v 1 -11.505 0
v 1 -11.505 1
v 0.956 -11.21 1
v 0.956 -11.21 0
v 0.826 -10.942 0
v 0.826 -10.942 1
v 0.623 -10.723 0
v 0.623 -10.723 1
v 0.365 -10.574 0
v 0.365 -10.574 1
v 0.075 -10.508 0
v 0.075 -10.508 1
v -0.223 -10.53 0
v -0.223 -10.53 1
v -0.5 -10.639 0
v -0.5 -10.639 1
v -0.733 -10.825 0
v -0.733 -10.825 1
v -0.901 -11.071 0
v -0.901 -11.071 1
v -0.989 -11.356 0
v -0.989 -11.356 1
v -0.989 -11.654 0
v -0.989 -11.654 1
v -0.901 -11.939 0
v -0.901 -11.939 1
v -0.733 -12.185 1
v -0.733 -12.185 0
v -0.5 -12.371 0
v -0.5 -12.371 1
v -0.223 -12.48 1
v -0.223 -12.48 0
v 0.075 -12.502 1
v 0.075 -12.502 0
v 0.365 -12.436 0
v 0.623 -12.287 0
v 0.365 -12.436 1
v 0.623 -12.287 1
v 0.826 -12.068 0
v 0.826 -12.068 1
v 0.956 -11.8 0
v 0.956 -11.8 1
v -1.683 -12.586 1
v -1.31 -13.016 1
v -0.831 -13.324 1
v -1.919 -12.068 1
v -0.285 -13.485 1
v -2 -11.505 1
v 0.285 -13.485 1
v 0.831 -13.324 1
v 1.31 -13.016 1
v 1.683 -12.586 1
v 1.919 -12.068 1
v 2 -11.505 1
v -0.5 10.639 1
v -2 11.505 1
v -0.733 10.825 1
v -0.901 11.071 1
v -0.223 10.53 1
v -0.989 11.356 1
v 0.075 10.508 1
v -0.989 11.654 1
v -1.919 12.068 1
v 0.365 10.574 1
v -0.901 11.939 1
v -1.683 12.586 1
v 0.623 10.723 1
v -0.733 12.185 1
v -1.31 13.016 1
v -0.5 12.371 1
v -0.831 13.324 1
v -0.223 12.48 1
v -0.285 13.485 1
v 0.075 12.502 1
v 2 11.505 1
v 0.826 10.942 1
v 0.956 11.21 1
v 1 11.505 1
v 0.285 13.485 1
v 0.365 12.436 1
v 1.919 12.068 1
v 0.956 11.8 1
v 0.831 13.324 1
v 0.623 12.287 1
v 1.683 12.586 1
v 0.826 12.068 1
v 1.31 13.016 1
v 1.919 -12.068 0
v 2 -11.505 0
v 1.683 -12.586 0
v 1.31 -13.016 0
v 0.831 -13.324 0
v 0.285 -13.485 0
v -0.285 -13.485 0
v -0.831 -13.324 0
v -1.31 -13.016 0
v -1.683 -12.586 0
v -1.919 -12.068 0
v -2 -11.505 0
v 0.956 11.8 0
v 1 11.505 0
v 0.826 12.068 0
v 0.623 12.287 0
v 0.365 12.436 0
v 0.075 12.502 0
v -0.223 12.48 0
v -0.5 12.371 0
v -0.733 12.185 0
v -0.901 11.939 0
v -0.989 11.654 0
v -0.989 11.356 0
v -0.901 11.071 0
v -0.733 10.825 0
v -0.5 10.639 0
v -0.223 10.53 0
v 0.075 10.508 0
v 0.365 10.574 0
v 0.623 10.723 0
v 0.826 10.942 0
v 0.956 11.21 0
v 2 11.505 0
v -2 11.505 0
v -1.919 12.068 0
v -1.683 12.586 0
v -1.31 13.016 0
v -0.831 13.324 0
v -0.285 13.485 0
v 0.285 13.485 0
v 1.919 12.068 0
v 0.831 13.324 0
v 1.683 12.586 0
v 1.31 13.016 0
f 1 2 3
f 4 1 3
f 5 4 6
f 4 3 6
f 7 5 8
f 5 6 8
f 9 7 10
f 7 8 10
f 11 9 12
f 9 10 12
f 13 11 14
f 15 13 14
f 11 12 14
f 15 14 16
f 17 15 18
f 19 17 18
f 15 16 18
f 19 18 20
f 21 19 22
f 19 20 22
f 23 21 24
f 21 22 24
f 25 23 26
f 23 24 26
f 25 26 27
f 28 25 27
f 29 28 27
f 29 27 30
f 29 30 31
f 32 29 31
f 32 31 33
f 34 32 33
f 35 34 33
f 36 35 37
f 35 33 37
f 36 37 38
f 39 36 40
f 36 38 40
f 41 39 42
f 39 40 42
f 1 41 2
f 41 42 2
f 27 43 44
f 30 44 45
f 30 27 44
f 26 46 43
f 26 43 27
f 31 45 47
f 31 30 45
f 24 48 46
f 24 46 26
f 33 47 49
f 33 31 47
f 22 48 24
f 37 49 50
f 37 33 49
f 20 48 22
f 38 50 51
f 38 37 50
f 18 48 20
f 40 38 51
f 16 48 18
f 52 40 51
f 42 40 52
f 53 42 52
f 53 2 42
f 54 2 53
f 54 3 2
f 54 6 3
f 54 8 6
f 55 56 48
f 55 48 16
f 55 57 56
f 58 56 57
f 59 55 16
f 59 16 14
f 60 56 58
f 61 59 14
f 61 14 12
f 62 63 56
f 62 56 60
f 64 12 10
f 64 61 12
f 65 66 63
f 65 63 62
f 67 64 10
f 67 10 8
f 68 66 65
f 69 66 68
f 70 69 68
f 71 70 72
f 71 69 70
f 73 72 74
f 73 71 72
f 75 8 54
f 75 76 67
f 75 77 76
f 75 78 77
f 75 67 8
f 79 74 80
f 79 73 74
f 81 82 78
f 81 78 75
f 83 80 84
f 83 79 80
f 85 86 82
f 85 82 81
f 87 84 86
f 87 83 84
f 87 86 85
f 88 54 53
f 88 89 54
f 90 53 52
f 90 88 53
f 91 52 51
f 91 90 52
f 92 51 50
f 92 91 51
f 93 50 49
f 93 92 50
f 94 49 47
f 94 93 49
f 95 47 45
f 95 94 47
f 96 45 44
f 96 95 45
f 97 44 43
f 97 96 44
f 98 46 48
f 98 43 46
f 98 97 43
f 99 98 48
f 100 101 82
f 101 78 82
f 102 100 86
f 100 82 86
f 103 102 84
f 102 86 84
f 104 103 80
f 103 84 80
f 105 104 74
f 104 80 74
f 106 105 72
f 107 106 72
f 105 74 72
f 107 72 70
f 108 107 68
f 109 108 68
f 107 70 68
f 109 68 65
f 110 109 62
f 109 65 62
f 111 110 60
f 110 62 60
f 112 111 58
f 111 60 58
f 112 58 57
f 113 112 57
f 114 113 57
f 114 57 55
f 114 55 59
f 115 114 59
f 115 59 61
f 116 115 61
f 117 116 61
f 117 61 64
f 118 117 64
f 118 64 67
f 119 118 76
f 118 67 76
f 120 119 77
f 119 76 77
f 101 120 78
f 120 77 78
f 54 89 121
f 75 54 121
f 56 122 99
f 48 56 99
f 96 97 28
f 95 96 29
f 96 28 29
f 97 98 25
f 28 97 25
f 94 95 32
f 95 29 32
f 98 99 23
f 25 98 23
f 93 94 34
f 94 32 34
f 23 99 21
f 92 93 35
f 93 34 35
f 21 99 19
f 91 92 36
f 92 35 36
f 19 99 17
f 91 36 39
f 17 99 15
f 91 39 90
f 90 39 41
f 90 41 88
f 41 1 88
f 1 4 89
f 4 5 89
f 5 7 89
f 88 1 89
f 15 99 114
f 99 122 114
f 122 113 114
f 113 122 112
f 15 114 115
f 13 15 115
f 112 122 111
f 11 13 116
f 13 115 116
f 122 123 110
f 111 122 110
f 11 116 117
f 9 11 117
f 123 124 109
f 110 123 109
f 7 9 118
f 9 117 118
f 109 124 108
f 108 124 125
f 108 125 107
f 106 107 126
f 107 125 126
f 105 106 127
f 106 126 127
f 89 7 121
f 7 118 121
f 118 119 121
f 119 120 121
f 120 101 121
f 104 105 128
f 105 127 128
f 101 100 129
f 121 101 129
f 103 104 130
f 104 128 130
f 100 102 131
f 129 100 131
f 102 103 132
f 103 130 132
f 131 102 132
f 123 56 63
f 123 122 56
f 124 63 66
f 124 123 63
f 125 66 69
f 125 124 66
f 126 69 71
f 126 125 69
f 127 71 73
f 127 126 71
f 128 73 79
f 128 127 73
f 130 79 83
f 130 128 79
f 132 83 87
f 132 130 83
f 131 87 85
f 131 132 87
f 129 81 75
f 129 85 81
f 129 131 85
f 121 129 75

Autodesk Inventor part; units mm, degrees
ref_plane "YZ Plane" through (0, 0, 0) normal (1, 0, 0) x (0, 1, 0)
ref_plane "XZ Plane" through (0, 0, 0) normal (0, 1, 0) x (-1, 0, 0)
ref_plane "XY Plane" through (0, 0, 0) normal (0, 0, 1) x (1, 0, 0)
sketch "草圖1" plane through (0, 0, 0) normal (0, 0, 1) x (1, 0, 0)
  line L0 (0, -11.505) -> (0, 11.505) construction
  line L1 (2, -11.505) -> (2, 11.505)
  line L2 (-2, 11.505) -> (-2, -11.505)
  arc A0 (-2, -11.505) -> (2, -11.505) centre (0, -11.505) ccw
  arc A1 (2, 11.505) -> (-2, 11.505) centre (0, 11.505) ccw
  point P0 (0, 0)
  dimension "d0" = 23.01
  dimension "d1" = 4
extrude "擠出1" add sketch "草圖1" along normal blind 1
sketch "草圖2" plane through (0, 0, 1) normal (0, 0, 1) x (1, 0, 0)
  arc A0 (2, 11.505) -> (-2, 11.505) centre (0, 11.505) ccw projected
  circle A1 centre (0, 11.505) radius 0.75
  arc A2 (-2, -11.505) -> (2, -11.505) centre (0, -11.505) ccw projected
  circle A3 centre (0, -11.505) radius 0.75
  point P0 (0, 0)
  dimension "d4" = 1.5
  dimension "d5" = 1.5
extrude "擠出2" add sketch "草圖2" along normal blind 1
sketch "草圖3" plane through (0, 0, 1) normal (0, 0, 1) x (1, 0, 0)
  circle A0 centre (0, 11.505) radius 0.75 projected
  circle A1 centre (0, -11.505) radius 0.75 projected
  circle A2 centre (0, 11.505) radius 1
  circle A3 centre (0, -11.505) radius 1
  point P0 (0, 0)
  dimension "d8" = 2
  dimension "d9" = 2
extrude "擠出3" cut sketch "草圖3" along normal mid plane 10 contours A0 | A1 | A2 | A3
properties part number "連桿2"
